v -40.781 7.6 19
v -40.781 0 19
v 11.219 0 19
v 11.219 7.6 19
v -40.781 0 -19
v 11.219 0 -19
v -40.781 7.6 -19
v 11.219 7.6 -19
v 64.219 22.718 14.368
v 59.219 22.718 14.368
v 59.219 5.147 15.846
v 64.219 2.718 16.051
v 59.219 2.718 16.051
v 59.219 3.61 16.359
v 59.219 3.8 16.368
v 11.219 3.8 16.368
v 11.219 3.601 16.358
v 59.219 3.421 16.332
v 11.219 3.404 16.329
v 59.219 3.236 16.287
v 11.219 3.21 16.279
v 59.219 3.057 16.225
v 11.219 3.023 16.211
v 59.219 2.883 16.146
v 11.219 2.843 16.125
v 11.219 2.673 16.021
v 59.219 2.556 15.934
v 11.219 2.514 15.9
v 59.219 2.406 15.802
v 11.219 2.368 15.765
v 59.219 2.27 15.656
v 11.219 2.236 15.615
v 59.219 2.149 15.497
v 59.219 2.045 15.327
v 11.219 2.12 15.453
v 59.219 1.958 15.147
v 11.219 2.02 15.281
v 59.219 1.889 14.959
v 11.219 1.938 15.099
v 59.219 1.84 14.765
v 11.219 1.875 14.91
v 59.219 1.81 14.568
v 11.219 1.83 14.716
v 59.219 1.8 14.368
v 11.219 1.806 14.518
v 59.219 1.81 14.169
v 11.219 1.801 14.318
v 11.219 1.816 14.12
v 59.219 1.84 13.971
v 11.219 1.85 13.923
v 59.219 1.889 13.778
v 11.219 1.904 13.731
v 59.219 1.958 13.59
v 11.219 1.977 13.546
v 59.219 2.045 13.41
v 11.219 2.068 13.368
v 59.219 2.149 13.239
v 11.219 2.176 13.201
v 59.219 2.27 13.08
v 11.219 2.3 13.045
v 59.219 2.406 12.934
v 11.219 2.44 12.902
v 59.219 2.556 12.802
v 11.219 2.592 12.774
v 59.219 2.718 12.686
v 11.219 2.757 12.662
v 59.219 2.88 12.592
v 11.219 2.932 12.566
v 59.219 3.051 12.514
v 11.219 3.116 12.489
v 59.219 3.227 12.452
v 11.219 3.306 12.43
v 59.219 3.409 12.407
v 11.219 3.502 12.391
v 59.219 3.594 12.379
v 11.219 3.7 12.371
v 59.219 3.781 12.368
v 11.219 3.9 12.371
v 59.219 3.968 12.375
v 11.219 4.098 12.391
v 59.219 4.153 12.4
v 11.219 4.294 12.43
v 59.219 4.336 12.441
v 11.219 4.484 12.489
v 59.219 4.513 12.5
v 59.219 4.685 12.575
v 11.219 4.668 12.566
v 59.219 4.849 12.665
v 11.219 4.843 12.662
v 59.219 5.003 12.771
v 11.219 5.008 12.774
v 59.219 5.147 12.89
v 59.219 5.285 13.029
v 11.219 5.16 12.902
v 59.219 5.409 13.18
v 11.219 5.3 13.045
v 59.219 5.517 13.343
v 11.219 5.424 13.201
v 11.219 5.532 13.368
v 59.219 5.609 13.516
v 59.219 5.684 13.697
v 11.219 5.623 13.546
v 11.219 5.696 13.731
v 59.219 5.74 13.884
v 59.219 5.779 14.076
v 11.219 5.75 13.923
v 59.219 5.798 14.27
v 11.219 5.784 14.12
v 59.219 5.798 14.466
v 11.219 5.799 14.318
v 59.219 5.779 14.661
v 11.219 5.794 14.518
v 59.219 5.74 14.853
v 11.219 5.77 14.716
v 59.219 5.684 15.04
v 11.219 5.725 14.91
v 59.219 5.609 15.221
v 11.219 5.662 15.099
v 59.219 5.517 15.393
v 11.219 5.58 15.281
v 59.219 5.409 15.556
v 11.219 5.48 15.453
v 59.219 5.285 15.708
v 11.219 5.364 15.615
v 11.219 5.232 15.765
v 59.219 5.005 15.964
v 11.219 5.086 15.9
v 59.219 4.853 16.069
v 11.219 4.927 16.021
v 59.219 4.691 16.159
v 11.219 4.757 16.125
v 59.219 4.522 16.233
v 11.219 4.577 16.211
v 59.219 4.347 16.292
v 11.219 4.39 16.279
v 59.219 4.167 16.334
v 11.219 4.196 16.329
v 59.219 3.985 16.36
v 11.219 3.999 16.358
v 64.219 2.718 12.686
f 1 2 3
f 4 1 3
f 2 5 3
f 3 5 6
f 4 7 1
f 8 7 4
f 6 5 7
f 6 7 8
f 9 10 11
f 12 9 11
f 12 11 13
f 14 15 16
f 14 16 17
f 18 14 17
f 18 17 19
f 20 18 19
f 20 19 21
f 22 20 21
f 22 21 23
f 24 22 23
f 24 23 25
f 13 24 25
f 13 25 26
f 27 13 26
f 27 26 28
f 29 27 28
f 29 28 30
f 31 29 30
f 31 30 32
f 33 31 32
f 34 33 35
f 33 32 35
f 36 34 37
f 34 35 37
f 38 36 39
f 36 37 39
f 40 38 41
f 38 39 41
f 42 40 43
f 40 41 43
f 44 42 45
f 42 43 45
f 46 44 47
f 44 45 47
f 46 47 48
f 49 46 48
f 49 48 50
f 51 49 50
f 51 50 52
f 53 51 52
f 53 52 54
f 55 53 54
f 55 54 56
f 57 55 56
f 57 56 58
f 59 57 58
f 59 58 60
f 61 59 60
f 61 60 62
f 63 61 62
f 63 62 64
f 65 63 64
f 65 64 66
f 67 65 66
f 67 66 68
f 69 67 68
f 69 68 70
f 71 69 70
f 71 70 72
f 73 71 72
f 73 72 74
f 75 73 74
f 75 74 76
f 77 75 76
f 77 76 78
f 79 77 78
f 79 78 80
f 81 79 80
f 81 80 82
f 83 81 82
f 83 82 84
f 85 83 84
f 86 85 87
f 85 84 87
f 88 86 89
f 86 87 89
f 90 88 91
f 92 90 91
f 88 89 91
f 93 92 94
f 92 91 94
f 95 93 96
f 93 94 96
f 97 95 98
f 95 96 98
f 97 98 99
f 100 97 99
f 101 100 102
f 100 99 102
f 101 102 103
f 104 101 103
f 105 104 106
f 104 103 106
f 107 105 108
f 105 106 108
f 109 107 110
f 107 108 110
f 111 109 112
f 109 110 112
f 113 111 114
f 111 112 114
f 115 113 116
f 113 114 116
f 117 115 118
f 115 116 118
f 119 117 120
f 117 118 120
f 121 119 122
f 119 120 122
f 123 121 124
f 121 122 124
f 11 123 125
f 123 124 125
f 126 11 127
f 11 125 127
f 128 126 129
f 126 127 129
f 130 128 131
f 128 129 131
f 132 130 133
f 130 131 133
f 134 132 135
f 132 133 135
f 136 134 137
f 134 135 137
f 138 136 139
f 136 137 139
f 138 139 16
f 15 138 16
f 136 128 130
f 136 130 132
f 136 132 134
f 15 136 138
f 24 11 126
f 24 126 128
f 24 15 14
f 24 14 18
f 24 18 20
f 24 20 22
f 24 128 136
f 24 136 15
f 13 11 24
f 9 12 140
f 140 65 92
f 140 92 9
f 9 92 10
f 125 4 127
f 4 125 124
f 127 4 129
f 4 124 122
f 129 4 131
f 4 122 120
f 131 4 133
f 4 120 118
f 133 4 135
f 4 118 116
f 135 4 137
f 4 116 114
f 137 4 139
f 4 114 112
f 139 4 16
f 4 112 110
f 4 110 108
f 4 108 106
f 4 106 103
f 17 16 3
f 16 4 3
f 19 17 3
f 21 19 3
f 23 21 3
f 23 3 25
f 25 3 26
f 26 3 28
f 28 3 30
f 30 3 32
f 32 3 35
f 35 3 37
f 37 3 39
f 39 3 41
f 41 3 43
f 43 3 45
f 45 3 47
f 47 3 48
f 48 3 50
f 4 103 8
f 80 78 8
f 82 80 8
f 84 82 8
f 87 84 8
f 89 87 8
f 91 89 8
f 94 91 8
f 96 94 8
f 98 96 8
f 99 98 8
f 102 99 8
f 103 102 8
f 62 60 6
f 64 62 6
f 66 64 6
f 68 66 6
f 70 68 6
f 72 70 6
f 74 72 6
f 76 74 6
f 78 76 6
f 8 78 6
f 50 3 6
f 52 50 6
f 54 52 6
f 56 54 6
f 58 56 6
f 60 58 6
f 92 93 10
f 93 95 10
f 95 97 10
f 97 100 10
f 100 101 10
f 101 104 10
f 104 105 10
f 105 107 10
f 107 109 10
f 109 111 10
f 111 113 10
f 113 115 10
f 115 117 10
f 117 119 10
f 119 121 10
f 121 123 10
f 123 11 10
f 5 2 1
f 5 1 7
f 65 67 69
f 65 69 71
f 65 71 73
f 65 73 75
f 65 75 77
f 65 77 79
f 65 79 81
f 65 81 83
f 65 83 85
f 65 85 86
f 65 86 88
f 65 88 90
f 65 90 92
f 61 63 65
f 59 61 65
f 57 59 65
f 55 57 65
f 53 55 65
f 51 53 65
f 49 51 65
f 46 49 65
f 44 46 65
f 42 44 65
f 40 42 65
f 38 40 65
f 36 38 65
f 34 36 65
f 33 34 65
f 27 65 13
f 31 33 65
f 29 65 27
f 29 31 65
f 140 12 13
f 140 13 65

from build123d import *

# Parameters (mm, degrees)
SKETCH1_W           = 52
SKETCH1_H           = 38
BOSS_EXTRUDE1_DEPTH = 7.6
SKETCH2_R           = 2
BOSS_EXTRUDE2_DEPTH = 48
BOSS_EXTRUDE3_DEPTH = 5


with BuildPart() as part:
    # Sketch1 → Boss-Extrude1 (new body)
    with BuildSketch(Plane(origin=(0, 0, 0), x_dir=(1, 0, 0), z_dir=(0, 1, 0))):
        with Locations((-14.781119537, 0)):
            Rectangle(SKETCH1_W, SKETCH1_H)
    extrude(amount=BOSS_EXTRUDE1_DEPTH)

    # Sketch2 → Boss-Extrude2 (add)
    with BuildSketch(Plane(origin=(11.218880463, 0, 0), x_dir=(0, 0, -1), z_dir=(1, 0, 0))):
        with Locations(Location((-14.368237461, 3.8, 0), (0, 0, 180))):
            Circle(SKETCH2_R)
    extrude(amount=BOSS_EXTRUDE2_DEPTH)

    # Sketch3 → Boss-Extrude3 (add)
    with BuildSketch(Plane(origin=(59.218880463, 0, 0), x_dir=(0, 0, -1), z_dir=(1, 0, 0))):
        Polygon((-16.050594412, 2.718484817), (-12.685880511, 2.718484817), (-14.368237461, 22.718484817), align=None)
    extrude(amount=BOSS_EXTRUDE3_DEPTH)


solid = part.part
